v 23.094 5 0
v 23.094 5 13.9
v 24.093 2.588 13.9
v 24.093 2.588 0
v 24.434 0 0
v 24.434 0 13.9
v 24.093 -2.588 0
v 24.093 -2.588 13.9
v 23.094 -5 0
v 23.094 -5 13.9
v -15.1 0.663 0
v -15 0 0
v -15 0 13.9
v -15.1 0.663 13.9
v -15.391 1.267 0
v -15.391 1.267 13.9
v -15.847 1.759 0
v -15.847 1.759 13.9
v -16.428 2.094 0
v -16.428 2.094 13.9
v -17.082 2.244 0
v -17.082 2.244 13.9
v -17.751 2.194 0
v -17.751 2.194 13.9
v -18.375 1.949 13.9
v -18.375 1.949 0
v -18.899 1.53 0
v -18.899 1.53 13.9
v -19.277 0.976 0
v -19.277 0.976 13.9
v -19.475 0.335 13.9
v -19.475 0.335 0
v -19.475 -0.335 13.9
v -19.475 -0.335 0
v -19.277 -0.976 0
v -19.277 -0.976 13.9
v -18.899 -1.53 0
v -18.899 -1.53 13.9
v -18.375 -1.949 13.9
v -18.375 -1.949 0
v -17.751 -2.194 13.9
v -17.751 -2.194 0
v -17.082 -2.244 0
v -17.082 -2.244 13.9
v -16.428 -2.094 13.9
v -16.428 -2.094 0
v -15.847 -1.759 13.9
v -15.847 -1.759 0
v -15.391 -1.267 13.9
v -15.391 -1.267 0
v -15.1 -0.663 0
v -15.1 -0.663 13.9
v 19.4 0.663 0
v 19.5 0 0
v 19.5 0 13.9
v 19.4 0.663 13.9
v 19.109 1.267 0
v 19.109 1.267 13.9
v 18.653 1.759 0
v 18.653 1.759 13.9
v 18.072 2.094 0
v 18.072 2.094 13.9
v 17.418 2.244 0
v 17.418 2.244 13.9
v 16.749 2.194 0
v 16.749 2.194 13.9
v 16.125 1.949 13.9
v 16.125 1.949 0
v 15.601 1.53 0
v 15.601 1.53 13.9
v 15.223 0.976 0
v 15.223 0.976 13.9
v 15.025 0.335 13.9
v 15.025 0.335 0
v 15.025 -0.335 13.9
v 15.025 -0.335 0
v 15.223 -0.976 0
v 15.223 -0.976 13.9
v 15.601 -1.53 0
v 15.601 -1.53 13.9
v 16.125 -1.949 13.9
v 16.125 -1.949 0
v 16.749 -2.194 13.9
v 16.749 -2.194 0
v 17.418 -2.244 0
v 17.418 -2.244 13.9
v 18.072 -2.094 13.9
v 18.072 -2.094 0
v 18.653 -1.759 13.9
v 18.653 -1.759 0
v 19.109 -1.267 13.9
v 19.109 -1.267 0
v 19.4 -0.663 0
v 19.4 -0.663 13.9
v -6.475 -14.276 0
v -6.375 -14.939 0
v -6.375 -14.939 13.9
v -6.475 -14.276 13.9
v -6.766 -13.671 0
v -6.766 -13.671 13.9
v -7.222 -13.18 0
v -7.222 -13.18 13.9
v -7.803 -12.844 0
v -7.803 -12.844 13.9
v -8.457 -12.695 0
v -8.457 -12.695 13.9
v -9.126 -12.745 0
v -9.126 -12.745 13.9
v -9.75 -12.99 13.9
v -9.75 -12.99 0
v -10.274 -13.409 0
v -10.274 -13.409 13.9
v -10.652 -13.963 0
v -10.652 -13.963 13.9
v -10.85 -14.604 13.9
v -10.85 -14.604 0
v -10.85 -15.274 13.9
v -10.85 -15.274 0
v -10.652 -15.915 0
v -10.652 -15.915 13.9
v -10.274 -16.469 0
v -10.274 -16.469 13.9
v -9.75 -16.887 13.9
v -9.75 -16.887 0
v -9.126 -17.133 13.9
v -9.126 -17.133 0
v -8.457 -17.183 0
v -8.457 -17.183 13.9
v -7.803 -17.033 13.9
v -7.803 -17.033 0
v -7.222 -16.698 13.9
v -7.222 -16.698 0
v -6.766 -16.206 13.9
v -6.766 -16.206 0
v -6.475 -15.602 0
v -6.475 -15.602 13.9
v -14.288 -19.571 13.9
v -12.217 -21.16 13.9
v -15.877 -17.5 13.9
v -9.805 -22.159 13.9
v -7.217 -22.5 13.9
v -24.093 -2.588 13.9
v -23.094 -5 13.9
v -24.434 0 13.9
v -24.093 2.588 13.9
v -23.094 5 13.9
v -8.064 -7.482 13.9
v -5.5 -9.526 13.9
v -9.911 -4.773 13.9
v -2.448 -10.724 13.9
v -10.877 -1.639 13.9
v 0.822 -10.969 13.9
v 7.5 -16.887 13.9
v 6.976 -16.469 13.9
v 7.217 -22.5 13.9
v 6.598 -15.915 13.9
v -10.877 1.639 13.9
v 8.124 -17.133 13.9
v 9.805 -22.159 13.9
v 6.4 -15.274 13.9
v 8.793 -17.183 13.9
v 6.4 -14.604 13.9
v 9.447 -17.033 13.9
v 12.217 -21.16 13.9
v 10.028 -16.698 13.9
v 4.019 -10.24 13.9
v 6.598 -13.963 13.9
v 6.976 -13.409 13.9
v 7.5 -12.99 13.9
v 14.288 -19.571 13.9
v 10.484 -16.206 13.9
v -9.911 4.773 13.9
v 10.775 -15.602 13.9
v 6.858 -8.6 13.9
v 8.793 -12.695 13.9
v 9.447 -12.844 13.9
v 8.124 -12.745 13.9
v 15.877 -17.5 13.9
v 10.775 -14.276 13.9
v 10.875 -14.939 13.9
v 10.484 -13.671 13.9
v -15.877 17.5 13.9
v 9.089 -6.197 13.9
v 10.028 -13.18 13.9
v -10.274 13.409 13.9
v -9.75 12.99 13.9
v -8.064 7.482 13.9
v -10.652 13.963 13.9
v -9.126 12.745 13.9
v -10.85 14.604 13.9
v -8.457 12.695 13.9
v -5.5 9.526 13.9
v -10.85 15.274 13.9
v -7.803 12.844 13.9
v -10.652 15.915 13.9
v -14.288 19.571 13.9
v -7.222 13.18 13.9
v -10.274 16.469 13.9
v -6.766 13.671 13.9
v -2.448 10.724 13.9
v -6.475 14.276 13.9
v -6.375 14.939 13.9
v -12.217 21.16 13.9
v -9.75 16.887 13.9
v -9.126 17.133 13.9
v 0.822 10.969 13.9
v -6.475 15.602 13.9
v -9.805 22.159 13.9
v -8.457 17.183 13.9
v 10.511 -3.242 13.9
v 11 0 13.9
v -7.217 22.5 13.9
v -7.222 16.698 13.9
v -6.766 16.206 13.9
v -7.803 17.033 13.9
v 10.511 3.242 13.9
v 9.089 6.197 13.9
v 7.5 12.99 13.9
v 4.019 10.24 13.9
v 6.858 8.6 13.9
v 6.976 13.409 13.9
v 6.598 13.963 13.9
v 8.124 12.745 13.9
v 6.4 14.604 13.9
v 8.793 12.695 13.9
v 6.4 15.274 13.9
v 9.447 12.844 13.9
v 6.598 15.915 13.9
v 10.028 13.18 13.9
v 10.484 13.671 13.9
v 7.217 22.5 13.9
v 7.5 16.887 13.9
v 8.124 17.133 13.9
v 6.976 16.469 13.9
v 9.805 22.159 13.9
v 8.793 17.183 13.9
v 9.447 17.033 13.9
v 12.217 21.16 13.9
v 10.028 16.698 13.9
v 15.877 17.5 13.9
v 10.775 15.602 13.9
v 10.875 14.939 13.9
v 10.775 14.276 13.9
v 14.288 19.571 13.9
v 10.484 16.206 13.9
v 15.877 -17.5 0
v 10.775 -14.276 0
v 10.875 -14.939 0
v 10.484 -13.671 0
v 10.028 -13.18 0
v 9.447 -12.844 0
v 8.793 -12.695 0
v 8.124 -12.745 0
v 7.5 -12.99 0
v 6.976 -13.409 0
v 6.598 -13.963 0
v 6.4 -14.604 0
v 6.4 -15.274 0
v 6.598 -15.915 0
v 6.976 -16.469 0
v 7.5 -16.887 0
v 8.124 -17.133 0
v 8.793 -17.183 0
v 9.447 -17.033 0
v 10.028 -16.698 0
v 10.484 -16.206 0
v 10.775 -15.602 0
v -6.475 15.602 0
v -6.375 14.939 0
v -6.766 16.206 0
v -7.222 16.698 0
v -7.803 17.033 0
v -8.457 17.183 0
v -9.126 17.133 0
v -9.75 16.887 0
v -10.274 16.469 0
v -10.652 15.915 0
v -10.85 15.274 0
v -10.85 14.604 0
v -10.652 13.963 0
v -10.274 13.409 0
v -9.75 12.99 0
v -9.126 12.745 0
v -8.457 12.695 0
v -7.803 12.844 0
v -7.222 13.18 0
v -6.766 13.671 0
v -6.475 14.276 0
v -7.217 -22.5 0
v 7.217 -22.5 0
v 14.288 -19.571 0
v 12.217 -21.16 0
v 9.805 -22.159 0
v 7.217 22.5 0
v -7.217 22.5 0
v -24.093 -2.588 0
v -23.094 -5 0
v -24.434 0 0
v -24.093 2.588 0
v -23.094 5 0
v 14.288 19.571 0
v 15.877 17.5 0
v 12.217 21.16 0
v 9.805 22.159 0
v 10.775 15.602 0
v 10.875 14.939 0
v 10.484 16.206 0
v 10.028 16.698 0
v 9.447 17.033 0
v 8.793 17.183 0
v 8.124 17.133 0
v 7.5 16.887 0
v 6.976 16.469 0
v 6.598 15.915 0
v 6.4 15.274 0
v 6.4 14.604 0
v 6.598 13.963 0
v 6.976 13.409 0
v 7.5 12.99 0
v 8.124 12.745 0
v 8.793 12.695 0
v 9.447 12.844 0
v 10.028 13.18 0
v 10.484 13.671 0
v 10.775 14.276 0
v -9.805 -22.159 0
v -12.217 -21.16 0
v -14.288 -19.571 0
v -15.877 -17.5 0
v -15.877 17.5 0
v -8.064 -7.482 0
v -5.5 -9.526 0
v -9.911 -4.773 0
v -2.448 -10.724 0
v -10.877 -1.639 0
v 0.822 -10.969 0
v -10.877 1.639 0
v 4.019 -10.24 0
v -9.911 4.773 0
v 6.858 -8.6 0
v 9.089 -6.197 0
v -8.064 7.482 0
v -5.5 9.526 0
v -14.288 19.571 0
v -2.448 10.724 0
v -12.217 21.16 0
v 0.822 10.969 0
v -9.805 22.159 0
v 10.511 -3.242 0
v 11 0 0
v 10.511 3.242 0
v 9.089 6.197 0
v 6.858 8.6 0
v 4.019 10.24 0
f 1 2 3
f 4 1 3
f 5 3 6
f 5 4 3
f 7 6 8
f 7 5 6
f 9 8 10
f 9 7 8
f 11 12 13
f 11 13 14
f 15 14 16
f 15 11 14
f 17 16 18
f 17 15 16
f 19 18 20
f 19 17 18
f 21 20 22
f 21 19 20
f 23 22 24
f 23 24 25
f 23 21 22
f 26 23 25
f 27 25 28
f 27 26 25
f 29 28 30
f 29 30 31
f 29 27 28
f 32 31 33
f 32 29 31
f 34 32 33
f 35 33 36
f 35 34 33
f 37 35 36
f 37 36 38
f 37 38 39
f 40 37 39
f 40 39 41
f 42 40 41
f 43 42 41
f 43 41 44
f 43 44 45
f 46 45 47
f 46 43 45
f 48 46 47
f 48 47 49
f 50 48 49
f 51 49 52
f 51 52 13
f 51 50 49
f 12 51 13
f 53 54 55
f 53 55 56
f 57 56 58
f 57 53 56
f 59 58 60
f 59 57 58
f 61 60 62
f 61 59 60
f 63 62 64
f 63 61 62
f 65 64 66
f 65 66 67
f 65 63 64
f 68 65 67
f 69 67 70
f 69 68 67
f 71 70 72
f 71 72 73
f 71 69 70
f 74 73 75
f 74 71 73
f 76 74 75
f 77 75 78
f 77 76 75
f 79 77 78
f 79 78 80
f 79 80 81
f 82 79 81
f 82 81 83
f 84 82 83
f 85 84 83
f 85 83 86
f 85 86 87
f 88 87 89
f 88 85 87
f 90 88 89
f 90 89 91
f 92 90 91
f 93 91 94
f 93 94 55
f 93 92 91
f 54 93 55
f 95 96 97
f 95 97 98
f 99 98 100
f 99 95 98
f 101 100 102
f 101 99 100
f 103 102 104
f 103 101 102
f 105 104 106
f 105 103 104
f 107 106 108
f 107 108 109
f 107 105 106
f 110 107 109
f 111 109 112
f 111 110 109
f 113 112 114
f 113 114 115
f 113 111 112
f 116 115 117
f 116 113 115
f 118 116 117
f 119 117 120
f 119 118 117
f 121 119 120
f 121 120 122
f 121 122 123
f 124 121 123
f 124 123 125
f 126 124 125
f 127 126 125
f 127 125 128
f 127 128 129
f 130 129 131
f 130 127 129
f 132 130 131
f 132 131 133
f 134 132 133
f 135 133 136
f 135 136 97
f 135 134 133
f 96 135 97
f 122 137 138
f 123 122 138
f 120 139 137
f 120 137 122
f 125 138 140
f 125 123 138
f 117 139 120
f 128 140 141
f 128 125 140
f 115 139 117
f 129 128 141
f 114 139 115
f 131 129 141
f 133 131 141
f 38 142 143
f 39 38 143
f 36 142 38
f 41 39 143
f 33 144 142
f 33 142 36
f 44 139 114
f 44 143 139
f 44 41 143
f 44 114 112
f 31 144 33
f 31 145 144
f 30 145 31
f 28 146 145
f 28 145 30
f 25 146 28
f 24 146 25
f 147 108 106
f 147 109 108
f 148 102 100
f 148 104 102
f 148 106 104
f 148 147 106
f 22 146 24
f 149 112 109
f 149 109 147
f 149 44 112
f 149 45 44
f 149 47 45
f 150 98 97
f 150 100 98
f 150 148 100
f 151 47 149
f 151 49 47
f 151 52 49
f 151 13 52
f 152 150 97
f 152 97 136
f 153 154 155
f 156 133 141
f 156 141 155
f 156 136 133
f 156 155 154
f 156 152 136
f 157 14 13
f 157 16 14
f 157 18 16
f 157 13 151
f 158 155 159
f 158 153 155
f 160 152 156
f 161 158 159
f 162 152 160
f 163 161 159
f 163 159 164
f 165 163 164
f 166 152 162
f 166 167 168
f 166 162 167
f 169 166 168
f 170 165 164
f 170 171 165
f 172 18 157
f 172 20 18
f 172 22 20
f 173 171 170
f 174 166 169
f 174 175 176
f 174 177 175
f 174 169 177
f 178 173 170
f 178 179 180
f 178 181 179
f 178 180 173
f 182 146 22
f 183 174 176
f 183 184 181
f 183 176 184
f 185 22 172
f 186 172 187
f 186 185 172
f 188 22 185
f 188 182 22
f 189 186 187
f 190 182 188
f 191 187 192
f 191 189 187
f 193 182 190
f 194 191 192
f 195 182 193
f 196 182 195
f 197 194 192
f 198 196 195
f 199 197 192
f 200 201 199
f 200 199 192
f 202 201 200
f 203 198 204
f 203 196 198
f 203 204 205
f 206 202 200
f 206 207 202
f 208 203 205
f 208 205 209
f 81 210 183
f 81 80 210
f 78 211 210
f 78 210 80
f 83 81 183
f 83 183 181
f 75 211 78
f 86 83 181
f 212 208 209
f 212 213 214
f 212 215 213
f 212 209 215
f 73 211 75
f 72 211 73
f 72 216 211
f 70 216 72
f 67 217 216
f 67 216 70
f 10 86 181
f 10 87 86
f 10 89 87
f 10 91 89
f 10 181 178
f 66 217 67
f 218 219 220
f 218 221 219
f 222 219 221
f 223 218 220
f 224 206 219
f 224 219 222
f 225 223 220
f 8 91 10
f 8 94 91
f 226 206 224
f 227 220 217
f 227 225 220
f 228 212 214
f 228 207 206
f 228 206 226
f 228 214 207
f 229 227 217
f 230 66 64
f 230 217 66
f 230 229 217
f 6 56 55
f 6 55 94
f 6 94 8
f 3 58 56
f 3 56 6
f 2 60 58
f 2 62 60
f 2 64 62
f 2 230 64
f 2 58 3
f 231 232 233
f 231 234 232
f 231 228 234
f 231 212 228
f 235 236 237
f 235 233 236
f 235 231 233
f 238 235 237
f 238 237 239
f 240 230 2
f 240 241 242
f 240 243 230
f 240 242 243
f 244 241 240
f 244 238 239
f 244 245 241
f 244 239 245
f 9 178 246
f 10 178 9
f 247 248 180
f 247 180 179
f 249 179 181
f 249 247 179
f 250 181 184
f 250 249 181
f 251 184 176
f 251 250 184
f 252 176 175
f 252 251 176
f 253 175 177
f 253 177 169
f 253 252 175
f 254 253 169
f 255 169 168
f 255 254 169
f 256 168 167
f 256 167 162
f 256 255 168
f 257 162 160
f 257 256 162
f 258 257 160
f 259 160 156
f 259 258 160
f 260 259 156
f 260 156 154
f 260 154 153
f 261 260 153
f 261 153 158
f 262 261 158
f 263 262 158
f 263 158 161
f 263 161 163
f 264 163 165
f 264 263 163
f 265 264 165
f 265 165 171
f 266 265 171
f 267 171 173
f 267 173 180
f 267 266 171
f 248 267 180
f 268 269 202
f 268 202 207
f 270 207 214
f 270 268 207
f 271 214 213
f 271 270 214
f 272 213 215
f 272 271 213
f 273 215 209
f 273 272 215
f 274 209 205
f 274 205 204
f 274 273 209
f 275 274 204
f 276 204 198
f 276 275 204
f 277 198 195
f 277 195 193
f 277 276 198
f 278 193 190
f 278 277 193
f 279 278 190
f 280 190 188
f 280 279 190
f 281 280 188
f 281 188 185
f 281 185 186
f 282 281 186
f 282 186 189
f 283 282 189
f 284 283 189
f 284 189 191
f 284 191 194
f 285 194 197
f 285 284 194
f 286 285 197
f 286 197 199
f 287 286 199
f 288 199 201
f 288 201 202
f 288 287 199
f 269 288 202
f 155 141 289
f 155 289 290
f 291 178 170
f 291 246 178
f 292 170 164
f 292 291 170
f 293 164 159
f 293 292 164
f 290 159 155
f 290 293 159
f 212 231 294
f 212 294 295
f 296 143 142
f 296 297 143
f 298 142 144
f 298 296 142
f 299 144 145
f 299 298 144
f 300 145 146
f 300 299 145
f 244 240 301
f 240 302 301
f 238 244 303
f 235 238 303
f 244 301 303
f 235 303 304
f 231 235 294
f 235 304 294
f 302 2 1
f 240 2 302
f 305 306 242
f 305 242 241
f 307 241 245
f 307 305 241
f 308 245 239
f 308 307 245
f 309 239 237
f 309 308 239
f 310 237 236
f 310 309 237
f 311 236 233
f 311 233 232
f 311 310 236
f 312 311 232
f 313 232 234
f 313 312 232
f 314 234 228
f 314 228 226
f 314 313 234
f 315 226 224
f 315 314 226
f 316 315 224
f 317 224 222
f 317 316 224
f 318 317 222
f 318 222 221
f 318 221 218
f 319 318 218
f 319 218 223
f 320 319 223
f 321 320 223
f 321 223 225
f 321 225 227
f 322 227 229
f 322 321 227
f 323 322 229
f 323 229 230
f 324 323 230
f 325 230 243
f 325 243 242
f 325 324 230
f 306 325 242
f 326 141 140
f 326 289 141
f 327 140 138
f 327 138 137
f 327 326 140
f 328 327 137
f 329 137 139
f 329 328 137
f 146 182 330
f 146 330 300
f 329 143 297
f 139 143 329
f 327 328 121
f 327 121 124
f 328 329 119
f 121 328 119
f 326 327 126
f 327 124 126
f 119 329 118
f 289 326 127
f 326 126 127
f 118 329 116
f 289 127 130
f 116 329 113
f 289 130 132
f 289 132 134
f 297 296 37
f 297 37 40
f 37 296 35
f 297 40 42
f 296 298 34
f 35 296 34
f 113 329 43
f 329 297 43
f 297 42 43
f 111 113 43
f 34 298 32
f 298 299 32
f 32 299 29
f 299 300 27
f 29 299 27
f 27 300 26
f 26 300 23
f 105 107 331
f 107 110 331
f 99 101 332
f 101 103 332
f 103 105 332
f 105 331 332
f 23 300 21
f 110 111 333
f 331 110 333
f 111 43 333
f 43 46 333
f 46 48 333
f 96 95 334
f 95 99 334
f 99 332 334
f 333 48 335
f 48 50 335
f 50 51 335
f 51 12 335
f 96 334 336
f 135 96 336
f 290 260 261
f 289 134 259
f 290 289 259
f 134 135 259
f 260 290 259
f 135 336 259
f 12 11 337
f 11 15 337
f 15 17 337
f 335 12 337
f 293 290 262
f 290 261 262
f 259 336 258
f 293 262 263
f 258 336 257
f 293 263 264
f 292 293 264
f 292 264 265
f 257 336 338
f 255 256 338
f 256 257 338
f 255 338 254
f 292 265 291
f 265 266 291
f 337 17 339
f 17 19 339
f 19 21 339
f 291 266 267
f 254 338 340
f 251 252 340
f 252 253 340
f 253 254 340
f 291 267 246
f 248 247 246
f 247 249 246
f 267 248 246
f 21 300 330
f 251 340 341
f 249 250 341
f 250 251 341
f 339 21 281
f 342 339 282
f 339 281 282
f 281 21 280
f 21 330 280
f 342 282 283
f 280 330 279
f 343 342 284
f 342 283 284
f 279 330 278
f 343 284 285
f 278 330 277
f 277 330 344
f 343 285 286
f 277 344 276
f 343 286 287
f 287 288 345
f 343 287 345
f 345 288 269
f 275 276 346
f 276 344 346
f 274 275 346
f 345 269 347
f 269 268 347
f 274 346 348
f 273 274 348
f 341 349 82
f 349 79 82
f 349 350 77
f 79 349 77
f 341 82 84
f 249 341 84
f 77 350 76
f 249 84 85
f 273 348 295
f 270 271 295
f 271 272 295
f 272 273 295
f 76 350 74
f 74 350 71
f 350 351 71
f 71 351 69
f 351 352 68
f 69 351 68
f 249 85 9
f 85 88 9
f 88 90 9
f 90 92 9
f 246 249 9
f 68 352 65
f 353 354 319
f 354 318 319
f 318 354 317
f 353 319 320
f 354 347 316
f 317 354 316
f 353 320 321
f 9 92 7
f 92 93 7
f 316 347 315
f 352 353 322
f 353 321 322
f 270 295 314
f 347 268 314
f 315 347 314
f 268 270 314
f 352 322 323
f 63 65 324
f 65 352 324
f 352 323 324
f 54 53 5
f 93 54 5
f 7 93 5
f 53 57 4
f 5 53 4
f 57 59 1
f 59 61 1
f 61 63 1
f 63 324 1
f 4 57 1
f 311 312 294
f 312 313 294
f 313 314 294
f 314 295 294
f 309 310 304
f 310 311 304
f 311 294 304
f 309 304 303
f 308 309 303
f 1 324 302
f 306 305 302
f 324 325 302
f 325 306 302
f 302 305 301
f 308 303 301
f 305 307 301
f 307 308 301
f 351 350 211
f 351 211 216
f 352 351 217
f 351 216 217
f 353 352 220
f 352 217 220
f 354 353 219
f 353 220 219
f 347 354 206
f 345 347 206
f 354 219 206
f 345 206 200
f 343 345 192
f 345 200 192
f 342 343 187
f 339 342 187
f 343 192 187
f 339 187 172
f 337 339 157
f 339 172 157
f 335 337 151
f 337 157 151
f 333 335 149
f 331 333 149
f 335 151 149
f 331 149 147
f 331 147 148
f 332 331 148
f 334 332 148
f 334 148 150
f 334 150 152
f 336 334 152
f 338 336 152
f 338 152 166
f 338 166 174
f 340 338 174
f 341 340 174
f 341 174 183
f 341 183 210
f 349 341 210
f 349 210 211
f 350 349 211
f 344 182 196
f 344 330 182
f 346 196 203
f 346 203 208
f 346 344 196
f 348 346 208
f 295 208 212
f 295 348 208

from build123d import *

# Parameters (mm, degrees)
SKETCH_1_R          = 29.4
SKETCH_1_R_2        = 2.25
EXTRUDE_1_DEPTH     = 13.9
SKETCH_2_OUTSIDE_W  = 77.662
SKETCH_2_OUTSIDE_H  = 77.662
SKETCH_2_OUTSIDE_R  = 11
CUT_EXTRUDE_1_DEPTH = 44.83982208
FILLET_1_R          = 10


with BuildPart() as part:
    # 草图1 → 凸台-拉伸1 (new body)
    with BuildSketch(Plane.XY):
        Circle(SKETCH_1_R)
        with Locations((-17.25, 0)):
            Circle(SKETCH_1_R_2, mode=Mode.SUBTRACT)
        with Locations((-8.625, 14.938938215)):
            Circle(SKETCH_1_R_2, mode=Mode.SUBTRACT)
        with Locations((8.625, 14.938938215)):
            Circle(SKETCH_1_R_2, mode=Mode.SUBTRACT)
        with Locations((17.25, 0)):
            Circle(SKETCH_1_R_2, mode=Mode.SUBTRACT)
        with Locations((8.625, -14.938938215)):
            Circle(SKETCH_1_R_2, mode=Mode.SUBTRACT)
        with Locations((-8.625, -14.938938215)):
            Circle(SKETCH_1_R_2, mode=Mode.SUBTRACT)
    extrude(amount=EXTRUDE_1_DEPTH)

    # 草图2 outside → 切除-拉伸1 (cut, through all)
    # profile 1 of 2: a face of its own
    with BuildSketch(Plane.XY.offset(13.9)):
        Rectangle(SKETCH_2_OUTSIDE_W, SKETCH_2_OUTSIDE_H)
        Polygon((12.990381057, 22.5), (-12.990381057, 22.5), (-25.980762114, 0), (-12.990381057, -22.5), (12.990381057, -22.5), (25.980762114, 0), align=None, mode=Mode.SUBTRACT)
    # profile 2 of 2: a face of its own
    with BuildSketch(Plane.XY.offset(13.9)):
        Circle(SKETCH_2_OUTSIDE_R)
    extrude(amount=-CUT_EXTRUDE_1_DEPTH, mode=Mode.SUBTRACT)

    # 圆角1
    fillet_1_edges = [part.edges().sort_by_distance(p)[0] for p in [
        (25.980762114, 0, 6.95),
        (12.990381057, -22.5, 6.95),
        (-12.990381057, -22.5, 6.95),
        (-25.980762114, 0, 6.95),
        (-12.990381057, 22.5, 6.95),
        (12.990381057, 22.5, 6.95),
    ]]
    fillet(fillet_1_edges, radius=FILLET_1_R)


solid = part.part
